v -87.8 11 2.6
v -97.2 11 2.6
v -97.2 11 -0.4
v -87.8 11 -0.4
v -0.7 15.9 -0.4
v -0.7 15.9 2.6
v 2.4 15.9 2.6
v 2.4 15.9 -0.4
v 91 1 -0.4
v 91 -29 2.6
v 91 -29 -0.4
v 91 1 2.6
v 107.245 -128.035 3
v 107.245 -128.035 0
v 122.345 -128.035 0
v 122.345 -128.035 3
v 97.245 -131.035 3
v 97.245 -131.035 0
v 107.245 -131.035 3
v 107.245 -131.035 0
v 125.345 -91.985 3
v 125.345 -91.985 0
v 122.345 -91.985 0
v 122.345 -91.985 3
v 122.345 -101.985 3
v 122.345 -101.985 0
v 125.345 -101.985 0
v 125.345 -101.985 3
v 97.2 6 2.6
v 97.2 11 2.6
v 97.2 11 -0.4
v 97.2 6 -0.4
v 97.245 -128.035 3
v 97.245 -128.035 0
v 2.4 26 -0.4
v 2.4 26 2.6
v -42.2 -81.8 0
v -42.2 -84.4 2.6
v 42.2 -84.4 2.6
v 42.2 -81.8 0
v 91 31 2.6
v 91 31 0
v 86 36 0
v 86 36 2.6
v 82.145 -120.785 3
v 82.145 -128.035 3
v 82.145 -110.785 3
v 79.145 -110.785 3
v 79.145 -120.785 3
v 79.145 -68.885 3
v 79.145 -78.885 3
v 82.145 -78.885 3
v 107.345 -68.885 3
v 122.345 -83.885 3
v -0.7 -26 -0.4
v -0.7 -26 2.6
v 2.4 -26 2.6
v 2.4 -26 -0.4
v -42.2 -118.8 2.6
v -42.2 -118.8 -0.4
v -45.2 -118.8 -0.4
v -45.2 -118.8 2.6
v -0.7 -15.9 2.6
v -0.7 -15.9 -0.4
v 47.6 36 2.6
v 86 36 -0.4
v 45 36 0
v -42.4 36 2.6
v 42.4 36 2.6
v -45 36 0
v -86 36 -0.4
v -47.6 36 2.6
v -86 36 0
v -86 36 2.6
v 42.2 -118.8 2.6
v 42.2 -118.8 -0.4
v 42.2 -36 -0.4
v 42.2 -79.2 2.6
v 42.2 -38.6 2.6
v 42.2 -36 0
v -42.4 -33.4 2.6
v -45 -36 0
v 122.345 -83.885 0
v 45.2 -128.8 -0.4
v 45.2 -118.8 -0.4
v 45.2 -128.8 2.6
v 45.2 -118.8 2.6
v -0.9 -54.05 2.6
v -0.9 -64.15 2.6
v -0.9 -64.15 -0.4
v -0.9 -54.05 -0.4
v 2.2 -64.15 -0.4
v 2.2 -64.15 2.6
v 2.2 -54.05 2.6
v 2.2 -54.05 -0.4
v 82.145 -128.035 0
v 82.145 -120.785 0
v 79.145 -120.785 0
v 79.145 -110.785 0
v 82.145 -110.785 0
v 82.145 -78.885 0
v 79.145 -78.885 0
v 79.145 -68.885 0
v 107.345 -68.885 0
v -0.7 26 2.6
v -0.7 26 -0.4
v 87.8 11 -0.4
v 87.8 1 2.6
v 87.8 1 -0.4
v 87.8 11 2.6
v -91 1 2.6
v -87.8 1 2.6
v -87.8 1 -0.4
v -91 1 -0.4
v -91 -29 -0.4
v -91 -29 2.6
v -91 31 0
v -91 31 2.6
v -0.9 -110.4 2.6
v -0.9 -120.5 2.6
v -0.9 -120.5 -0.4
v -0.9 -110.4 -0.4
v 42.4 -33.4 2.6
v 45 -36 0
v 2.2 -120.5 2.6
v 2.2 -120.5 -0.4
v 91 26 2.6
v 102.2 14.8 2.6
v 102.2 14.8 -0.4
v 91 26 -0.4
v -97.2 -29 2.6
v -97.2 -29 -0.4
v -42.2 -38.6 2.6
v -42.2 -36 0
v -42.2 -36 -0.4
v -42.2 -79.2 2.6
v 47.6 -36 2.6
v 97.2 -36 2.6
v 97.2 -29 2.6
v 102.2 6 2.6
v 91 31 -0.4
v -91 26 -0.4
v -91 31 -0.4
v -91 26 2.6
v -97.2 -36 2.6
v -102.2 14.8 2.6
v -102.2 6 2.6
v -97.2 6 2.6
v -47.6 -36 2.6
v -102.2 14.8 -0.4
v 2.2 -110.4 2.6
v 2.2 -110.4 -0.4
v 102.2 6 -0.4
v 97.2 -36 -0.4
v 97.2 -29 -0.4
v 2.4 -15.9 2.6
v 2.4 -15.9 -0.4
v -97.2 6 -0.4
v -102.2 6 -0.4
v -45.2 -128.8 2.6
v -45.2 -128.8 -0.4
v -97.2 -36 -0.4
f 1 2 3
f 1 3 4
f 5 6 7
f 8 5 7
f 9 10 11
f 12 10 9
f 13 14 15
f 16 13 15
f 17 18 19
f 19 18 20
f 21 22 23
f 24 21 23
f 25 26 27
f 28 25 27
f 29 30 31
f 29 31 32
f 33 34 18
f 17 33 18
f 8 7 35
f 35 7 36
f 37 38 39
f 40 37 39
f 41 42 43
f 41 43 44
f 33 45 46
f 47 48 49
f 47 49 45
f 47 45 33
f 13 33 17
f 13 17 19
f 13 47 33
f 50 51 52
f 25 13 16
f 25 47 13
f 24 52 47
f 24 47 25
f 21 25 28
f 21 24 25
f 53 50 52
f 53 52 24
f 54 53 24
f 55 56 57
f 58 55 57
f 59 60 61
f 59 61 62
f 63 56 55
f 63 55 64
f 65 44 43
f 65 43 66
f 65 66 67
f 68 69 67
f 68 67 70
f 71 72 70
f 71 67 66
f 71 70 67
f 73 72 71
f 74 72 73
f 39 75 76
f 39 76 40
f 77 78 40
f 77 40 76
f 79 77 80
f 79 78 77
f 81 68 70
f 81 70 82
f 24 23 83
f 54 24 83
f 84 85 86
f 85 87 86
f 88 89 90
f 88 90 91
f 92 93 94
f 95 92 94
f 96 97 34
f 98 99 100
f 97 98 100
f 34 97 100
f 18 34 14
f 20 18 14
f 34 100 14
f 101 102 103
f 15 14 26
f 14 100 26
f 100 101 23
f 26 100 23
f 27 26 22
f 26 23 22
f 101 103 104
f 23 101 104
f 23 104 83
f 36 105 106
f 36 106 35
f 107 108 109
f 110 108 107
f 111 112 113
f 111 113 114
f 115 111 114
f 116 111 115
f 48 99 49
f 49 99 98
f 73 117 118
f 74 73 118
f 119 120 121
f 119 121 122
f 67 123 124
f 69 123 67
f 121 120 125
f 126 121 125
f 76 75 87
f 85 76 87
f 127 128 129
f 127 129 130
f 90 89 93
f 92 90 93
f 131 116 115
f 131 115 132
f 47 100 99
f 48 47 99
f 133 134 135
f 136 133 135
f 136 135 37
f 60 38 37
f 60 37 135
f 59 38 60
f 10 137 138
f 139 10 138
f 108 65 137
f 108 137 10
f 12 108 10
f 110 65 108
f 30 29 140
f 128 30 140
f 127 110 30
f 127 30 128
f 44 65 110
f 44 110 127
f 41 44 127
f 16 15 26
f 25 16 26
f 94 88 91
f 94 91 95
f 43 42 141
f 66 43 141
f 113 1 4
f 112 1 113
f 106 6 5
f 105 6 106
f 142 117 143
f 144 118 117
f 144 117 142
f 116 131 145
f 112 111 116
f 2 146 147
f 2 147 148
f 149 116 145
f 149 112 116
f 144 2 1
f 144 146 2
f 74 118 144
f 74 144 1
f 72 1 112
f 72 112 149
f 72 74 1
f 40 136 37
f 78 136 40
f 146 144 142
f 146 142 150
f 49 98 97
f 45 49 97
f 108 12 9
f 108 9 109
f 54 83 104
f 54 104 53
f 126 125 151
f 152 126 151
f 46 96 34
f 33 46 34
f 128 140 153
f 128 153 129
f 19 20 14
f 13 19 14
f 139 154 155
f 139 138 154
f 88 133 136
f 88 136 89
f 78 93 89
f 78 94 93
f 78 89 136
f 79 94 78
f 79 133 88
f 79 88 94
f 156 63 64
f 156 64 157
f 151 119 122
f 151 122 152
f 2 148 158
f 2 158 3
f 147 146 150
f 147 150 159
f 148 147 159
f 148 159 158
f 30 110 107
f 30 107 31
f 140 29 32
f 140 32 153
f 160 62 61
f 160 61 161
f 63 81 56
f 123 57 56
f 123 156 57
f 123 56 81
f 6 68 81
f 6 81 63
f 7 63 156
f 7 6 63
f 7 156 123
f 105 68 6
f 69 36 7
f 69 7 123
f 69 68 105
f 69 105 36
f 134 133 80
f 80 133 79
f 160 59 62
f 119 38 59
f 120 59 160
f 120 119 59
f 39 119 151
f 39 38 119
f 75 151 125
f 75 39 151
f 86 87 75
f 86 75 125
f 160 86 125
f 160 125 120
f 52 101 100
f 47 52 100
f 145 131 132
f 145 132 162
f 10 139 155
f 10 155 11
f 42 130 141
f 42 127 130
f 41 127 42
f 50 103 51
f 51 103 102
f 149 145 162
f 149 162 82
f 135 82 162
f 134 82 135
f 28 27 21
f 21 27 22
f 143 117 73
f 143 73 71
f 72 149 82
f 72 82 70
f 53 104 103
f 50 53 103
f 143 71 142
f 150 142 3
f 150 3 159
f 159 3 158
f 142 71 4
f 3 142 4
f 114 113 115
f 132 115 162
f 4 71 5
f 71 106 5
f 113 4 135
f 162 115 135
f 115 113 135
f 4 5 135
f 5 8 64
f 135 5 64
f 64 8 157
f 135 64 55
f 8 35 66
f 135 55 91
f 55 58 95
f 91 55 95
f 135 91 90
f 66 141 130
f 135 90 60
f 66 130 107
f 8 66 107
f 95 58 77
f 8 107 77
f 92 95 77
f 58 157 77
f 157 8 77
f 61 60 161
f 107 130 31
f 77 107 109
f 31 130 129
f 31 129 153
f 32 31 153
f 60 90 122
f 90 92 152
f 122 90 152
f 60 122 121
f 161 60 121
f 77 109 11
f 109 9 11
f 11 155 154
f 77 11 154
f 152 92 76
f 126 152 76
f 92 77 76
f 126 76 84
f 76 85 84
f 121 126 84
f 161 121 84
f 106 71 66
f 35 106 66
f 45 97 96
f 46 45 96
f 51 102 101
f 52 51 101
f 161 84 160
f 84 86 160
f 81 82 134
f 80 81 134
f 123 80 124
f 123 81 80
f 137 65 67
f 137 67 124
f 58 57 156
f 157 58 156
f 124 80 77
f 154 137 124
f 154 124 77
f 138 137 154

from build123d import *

# Parameters (mm, degrees)
F1_DEPTH   = 2.6
F2_SIZE    = 2.59999
F2_2_SIZE  = 2.59999
F3_DEPTH   = 2.6
F4_SIZE    = 2.59999
F5_W       = 3.1
F5_H       = 10.1
F6_DEPTH   = 4
F0_W       = 84.4
F0_H       = 45.8
F7_DEPTH   = 2.6
F8_SIZE    = 2.59999
F0_H_2     = 47
F9_DEPTH   = 2.6
F10_SIZE   = 2.59999
F11_W      = 10
F11_H      = 2.6
F12_DEPTH  = 3
F15_W      = 3.1
F15_H      = 10.1
F14_W      = 3.1
F14_H      = 10.1
F16_DEPTH  = 4
F18_DEPTH  = 3
F19_SIZE   = 5
F19_2_SIZE = 5
F20_SIZE   = 15
F21_DEPTH  = 0.4
F22_DEPTH  = 0.4
F23_DEPTH  = 25
F24_SIZE   = 4.99999


# Not quite as in the source:
# - a fillet or chamfer is up to 0.001 mm smaller than in the source, because OpenCascade refuses the exact size


with BuildPart() as f1:
    # F0 (on Top) → F1 (new body)
    with BuildSketch(Plane.XY):
        Polygon((-45, -36), (-45, 36), (-91, 36), (-91, 26), (-102.2, 14.8), (-102.2, 6), (-97.2, 6), (-97.2, 11), (-91, 11), (-87.8, 11), (-87.8, 1), (-91, 1), (-91, -29), (-97.2, -29), (-97.2, -36), (-91, -36), align=None)
    extrude(amount=F1_DEPTH)

    # F2#2 (size 2.6 in the source; OpenCascade refuses exactly that, so slightly less here)
    f2_2_edges = [f1.edges().sort_by_distance(p)[0] for p in [
        (-45, 0, 2.6),
    ]]
    chamfer(f2_2_edges, length=F2_2_SIZE)

    # F19#2
    f19_2_edges = [f1.edges().sort_by_distance(p)[0] for p in [
        (-91, 36, 1.3),
    ]]
    chamfer(f19_2_edges, length=F19_2_SIZE)



with BuildPart() as f1b:
    # F0 (on Top) → F1, piece 2 (new body)
    with BuildSketch(Plane.XY):
        Polygon((45, 36), (45, -36), (91, -36), (97.2, -36), (97.2, -29), (91, -29), (91, 1), (87.8, 1), (87.8, 11), (91, 11), (97.2, 11), (97.2, 6), (102.2, 6), (102.2, 14.8), (91, 26), (91, 36), align=None)
    extrude(amount=F1_DEPTH)

    # F2 (size 2.6 in the source; OpenCascade refuses exactly that, so slightly less here)
    f2_edges = [f1b.edges().sort_by_distance(p)[0] for p in [
        (45, 0, 2.6),
    ]]
    chamfer(f2_edges, length=F2_SIZE)

    # F19
    f19_edges = [f1b.edges().sort_by_distance(p)[0] for p in [
        (91, 36, 1.3),
    ]]
    chamfer(f19_edges, length=F19_SIZE)


with BuildPart() as f3:
    # F0 (on Top) → F3 (new body)
    with BuildSketch(Plane.XY):
        Polygon((42.2, -36), (45, -36), (45, 36), (-45, 36), (-45, -36), (-42.2, -36), align=None)
    extrude(amount=F3_DEPTH)

    # F4 (size 2.6 in the source; OpenCascade refuses exactly that, so slightly less here)
    f4_edges = [f3.edges().sort_by_distance(p)[0] for p in [
        (45, 0, 2.6),
        (-45, 0, 2.6),
        (0, -36, 2.6),
    ]]
    chamfer(f4_edges, length=F4_SIZE)

    # F5 (on face) → F6 (cut)
    with BuildSketch(Plane.XY.offset(2.6)):
        with Locations((0.85, 20.95)):
            Rectangle(F5_W, F5_H)
        with Locations((0.85, -20.95)):
            Rectangle(F5_W, F5_H)
    extrude(amount=-F6_DEPTH, mode=Mode.SUBTRACT)


with BuildPart() as f7:
    # F0 (on Top) → F7 (new body)
    with BuildSketch(Plane.XY):
        with Locations((0, -58.9)):
            Rectangle(F0_W, F0_H)
    extrude(amount=F7_DEPTH)

    # F8 (size 2.6 in the source; OpenCascade refuses exactly that, so slightly less here)
    f8_edges = [f7.edges().sort_by_distance(p)[0] for p in [
        (0, -36, 2.6),
        (0, -81.8, 2.6),
    ]]
    chamfer(f8_edges, length=F8_SIZE)


with BuildPart() as f9:
    # F0 (on Top) → F9 (new body)
    with BuildSketch(Plane.XY):
        with Locations((0, -105.3)):
            Rectangle(F0_W, F0_H_2)
    extrude(amount=F9_DEPTH)

    # F10 (size 2.6 in the source; OpenCascade refuses exactly that, so slightly less here)
    f10_edges = [f9.edges().sort_by_distance(p)[0] for p in [
        (0, -81.8, 2.6),
    ]]
    chamfer(f10_edges, length=F10_SIZE)

    # F13: F12 across plane


with BuildPart() as f12:
    # F11 (on face) → F12 (new body)
    with BuildSketch(Plane(origin=(-42.2, 0, 0), x_dir=(0, -1, 0), z_dir=(-1, 0, 0))):
        with Locations((123.8, 1.3)):
            Rectangle(F11_W, F11_H)
    extrude(amount=F12_DEPTH)


with BuildPart() as f9_1:
    add(f9.part)
    add(f12.part.mirror(Plane.YZ))


with BuildPart() as f16_tool:
    # F15 (on face) + F14 (on face) → F16 (new body)
    with BuildSketch(Plane.XY.offset(2.6)):
        with Locations((0.65, -115.45)):
            Rectangle(F15_W, F15_H)
    with BuildSketch(Plane.XY.offset(2.6)):
        with Locations((0.65, -59.1)):
            Rectangle(F14_W, F14_H)
    extrude(amount=-F16_DEPTH)


with BuildPart() as f7_1:
    add(f7.part)

    # F16: cut by f16_tool
    add(f16_tool.part, mode=Mode.SUBTRACT)


with BuildPart() as f9_2:
    add(f9_1.part)

    # F16: cut by f16_tool
    add(f16_tool.part, mode=Mode.SUBTRACT)


with BuildPart() as f18:
    # F17 (on Top) → F18 (new body)
    with BuildSketch(Plane.XY):
        Polygon((122.3451334953, -68.8853332162), (82.1451334953, -68.8853332162), (79.1451334953, -68.8853332162), (79.1451334953, -78.8853332162), (82.1451334953, -78.8853332162), (82.1451334953, -110.7853332162), (79.1451334953, -110.7853332162), (79.1451334953, -120.7853332162), (82.1451334953, -120.7853332162), (82.1451334953, -128.0353332162), (97.2451334953, -128.0353332162), (97.2451334953, -131.0353332162), (102.2451334953, -131.0353332162), (107.2451334953, -131.0353332162), (107.2451334953, -128.0353332162), (122.3451334953, -128.0353332162), (122.3451334953, -101.9853332162), (125.3451334953, -101.9853332162), (125.3451334953, -91.9853332162), (122.3451334953, -91.9853332162), align=None)
    extrude(amount=F18_DEPTH)

    # F20
    f20_edges = [f18.edges().sort_by_distance(p)[0] for p in [
        (122.345133, -68.885333, 1.5),
    ]]
    chamfer(f20_edges, length=F20_SIZE)


with BuildPart() as f1_1:
    add(f1.part)

    add(f1b.part)  # F21 merges F1b

    add(f3.part)  # F21 merges F3

    add(f7_1.part)  # F21 merges F7

    add(f9_2.part)  # F21 merges F9

    add(f12.part)  # F21 merges F12
    # F0 (on Top) → F21 (join)
    with BuildSketch(Plane.XY):
        Polygon((45, 36), (45, -36), (91, -36), (97.2, -36), (97.2, -29), (91, -29), (91, 1), (87.8, 1), (87.8, 11), (91, 11), (97.2, 11), (97.2, 6), (102.2, 6), (102.2, 14.8), (91, 26), (91, 36), align=None)
        Polygon((-45, -36), (-45, 36), (-91, 36), (-91, 26), (-102.2, 14.8), (-102.2, 6), (-97.2, 6), (-97.2, 11), (-91, 11), (-87.8, 11), (-87.8, 1), (-91, 1), (-91, -29), (-97.2, -29), (-97.2, -36), (-91, -36), align=None)
        with Locations((0, -105.3)):
            Rectangle(F0_W, F0_H_2)
        with Locations((0, -58.9)):
            Rectangle(F0_W, F0_H)
        Polygon((42.2, -36), (45, -36), (45, 36), (-45, 36), (-45, -36), (-42.2, -36), align=None)
    extrude(amount=-F21_DEPTH)

    # F22 (add): faces of the model
    f22_faces = [f1_1.faces().sort_by_distance(p)[0] for p in [
        (43.7, -123.8, 0),
        (-43.7, -123.8, 0),
    ]]
    extrude(f22_faces, amount=F22_DEPTH)

    # F15 (on face) + F14 (on face) + F5 (on face) → F23 (cut)
    with BuildSketch(Plane.XY.offset(2.6)):
        with Locations((0.65, -115.45)):
            Rectangle(F15_W, F15_H)
    with BuildSketch(Plane.XY.offset(2.6)):
        with Locations((0.65, -59.1)):
            Rectangle(F14_W, F14_H)
    with BuildSketch(Plane.XY.offset(2.6)):
        with Locations((0.85, 20.95)):
            Rectangle(F5_W, F5_H)
        with Locations((0.85, -20.95)):
            Rectangle(F5_W, F5_H)
    extrude(amount=-F23_DEPTH, mode=Mode.SUBTRACT)

    # F24 (size 5 in the source; OpenCascade refuses exactly that, so slightly less here)
    f24_edges = [f1_1.edges().sort_by_distance(p)[0] for p in [
        (-91, 36, -0.2),
        (91, 36, -0.2),
    ]]
    chamfer(f24_edges, length=F24_SIZE)


solid = Compound([f18.part, f1_1.part])
